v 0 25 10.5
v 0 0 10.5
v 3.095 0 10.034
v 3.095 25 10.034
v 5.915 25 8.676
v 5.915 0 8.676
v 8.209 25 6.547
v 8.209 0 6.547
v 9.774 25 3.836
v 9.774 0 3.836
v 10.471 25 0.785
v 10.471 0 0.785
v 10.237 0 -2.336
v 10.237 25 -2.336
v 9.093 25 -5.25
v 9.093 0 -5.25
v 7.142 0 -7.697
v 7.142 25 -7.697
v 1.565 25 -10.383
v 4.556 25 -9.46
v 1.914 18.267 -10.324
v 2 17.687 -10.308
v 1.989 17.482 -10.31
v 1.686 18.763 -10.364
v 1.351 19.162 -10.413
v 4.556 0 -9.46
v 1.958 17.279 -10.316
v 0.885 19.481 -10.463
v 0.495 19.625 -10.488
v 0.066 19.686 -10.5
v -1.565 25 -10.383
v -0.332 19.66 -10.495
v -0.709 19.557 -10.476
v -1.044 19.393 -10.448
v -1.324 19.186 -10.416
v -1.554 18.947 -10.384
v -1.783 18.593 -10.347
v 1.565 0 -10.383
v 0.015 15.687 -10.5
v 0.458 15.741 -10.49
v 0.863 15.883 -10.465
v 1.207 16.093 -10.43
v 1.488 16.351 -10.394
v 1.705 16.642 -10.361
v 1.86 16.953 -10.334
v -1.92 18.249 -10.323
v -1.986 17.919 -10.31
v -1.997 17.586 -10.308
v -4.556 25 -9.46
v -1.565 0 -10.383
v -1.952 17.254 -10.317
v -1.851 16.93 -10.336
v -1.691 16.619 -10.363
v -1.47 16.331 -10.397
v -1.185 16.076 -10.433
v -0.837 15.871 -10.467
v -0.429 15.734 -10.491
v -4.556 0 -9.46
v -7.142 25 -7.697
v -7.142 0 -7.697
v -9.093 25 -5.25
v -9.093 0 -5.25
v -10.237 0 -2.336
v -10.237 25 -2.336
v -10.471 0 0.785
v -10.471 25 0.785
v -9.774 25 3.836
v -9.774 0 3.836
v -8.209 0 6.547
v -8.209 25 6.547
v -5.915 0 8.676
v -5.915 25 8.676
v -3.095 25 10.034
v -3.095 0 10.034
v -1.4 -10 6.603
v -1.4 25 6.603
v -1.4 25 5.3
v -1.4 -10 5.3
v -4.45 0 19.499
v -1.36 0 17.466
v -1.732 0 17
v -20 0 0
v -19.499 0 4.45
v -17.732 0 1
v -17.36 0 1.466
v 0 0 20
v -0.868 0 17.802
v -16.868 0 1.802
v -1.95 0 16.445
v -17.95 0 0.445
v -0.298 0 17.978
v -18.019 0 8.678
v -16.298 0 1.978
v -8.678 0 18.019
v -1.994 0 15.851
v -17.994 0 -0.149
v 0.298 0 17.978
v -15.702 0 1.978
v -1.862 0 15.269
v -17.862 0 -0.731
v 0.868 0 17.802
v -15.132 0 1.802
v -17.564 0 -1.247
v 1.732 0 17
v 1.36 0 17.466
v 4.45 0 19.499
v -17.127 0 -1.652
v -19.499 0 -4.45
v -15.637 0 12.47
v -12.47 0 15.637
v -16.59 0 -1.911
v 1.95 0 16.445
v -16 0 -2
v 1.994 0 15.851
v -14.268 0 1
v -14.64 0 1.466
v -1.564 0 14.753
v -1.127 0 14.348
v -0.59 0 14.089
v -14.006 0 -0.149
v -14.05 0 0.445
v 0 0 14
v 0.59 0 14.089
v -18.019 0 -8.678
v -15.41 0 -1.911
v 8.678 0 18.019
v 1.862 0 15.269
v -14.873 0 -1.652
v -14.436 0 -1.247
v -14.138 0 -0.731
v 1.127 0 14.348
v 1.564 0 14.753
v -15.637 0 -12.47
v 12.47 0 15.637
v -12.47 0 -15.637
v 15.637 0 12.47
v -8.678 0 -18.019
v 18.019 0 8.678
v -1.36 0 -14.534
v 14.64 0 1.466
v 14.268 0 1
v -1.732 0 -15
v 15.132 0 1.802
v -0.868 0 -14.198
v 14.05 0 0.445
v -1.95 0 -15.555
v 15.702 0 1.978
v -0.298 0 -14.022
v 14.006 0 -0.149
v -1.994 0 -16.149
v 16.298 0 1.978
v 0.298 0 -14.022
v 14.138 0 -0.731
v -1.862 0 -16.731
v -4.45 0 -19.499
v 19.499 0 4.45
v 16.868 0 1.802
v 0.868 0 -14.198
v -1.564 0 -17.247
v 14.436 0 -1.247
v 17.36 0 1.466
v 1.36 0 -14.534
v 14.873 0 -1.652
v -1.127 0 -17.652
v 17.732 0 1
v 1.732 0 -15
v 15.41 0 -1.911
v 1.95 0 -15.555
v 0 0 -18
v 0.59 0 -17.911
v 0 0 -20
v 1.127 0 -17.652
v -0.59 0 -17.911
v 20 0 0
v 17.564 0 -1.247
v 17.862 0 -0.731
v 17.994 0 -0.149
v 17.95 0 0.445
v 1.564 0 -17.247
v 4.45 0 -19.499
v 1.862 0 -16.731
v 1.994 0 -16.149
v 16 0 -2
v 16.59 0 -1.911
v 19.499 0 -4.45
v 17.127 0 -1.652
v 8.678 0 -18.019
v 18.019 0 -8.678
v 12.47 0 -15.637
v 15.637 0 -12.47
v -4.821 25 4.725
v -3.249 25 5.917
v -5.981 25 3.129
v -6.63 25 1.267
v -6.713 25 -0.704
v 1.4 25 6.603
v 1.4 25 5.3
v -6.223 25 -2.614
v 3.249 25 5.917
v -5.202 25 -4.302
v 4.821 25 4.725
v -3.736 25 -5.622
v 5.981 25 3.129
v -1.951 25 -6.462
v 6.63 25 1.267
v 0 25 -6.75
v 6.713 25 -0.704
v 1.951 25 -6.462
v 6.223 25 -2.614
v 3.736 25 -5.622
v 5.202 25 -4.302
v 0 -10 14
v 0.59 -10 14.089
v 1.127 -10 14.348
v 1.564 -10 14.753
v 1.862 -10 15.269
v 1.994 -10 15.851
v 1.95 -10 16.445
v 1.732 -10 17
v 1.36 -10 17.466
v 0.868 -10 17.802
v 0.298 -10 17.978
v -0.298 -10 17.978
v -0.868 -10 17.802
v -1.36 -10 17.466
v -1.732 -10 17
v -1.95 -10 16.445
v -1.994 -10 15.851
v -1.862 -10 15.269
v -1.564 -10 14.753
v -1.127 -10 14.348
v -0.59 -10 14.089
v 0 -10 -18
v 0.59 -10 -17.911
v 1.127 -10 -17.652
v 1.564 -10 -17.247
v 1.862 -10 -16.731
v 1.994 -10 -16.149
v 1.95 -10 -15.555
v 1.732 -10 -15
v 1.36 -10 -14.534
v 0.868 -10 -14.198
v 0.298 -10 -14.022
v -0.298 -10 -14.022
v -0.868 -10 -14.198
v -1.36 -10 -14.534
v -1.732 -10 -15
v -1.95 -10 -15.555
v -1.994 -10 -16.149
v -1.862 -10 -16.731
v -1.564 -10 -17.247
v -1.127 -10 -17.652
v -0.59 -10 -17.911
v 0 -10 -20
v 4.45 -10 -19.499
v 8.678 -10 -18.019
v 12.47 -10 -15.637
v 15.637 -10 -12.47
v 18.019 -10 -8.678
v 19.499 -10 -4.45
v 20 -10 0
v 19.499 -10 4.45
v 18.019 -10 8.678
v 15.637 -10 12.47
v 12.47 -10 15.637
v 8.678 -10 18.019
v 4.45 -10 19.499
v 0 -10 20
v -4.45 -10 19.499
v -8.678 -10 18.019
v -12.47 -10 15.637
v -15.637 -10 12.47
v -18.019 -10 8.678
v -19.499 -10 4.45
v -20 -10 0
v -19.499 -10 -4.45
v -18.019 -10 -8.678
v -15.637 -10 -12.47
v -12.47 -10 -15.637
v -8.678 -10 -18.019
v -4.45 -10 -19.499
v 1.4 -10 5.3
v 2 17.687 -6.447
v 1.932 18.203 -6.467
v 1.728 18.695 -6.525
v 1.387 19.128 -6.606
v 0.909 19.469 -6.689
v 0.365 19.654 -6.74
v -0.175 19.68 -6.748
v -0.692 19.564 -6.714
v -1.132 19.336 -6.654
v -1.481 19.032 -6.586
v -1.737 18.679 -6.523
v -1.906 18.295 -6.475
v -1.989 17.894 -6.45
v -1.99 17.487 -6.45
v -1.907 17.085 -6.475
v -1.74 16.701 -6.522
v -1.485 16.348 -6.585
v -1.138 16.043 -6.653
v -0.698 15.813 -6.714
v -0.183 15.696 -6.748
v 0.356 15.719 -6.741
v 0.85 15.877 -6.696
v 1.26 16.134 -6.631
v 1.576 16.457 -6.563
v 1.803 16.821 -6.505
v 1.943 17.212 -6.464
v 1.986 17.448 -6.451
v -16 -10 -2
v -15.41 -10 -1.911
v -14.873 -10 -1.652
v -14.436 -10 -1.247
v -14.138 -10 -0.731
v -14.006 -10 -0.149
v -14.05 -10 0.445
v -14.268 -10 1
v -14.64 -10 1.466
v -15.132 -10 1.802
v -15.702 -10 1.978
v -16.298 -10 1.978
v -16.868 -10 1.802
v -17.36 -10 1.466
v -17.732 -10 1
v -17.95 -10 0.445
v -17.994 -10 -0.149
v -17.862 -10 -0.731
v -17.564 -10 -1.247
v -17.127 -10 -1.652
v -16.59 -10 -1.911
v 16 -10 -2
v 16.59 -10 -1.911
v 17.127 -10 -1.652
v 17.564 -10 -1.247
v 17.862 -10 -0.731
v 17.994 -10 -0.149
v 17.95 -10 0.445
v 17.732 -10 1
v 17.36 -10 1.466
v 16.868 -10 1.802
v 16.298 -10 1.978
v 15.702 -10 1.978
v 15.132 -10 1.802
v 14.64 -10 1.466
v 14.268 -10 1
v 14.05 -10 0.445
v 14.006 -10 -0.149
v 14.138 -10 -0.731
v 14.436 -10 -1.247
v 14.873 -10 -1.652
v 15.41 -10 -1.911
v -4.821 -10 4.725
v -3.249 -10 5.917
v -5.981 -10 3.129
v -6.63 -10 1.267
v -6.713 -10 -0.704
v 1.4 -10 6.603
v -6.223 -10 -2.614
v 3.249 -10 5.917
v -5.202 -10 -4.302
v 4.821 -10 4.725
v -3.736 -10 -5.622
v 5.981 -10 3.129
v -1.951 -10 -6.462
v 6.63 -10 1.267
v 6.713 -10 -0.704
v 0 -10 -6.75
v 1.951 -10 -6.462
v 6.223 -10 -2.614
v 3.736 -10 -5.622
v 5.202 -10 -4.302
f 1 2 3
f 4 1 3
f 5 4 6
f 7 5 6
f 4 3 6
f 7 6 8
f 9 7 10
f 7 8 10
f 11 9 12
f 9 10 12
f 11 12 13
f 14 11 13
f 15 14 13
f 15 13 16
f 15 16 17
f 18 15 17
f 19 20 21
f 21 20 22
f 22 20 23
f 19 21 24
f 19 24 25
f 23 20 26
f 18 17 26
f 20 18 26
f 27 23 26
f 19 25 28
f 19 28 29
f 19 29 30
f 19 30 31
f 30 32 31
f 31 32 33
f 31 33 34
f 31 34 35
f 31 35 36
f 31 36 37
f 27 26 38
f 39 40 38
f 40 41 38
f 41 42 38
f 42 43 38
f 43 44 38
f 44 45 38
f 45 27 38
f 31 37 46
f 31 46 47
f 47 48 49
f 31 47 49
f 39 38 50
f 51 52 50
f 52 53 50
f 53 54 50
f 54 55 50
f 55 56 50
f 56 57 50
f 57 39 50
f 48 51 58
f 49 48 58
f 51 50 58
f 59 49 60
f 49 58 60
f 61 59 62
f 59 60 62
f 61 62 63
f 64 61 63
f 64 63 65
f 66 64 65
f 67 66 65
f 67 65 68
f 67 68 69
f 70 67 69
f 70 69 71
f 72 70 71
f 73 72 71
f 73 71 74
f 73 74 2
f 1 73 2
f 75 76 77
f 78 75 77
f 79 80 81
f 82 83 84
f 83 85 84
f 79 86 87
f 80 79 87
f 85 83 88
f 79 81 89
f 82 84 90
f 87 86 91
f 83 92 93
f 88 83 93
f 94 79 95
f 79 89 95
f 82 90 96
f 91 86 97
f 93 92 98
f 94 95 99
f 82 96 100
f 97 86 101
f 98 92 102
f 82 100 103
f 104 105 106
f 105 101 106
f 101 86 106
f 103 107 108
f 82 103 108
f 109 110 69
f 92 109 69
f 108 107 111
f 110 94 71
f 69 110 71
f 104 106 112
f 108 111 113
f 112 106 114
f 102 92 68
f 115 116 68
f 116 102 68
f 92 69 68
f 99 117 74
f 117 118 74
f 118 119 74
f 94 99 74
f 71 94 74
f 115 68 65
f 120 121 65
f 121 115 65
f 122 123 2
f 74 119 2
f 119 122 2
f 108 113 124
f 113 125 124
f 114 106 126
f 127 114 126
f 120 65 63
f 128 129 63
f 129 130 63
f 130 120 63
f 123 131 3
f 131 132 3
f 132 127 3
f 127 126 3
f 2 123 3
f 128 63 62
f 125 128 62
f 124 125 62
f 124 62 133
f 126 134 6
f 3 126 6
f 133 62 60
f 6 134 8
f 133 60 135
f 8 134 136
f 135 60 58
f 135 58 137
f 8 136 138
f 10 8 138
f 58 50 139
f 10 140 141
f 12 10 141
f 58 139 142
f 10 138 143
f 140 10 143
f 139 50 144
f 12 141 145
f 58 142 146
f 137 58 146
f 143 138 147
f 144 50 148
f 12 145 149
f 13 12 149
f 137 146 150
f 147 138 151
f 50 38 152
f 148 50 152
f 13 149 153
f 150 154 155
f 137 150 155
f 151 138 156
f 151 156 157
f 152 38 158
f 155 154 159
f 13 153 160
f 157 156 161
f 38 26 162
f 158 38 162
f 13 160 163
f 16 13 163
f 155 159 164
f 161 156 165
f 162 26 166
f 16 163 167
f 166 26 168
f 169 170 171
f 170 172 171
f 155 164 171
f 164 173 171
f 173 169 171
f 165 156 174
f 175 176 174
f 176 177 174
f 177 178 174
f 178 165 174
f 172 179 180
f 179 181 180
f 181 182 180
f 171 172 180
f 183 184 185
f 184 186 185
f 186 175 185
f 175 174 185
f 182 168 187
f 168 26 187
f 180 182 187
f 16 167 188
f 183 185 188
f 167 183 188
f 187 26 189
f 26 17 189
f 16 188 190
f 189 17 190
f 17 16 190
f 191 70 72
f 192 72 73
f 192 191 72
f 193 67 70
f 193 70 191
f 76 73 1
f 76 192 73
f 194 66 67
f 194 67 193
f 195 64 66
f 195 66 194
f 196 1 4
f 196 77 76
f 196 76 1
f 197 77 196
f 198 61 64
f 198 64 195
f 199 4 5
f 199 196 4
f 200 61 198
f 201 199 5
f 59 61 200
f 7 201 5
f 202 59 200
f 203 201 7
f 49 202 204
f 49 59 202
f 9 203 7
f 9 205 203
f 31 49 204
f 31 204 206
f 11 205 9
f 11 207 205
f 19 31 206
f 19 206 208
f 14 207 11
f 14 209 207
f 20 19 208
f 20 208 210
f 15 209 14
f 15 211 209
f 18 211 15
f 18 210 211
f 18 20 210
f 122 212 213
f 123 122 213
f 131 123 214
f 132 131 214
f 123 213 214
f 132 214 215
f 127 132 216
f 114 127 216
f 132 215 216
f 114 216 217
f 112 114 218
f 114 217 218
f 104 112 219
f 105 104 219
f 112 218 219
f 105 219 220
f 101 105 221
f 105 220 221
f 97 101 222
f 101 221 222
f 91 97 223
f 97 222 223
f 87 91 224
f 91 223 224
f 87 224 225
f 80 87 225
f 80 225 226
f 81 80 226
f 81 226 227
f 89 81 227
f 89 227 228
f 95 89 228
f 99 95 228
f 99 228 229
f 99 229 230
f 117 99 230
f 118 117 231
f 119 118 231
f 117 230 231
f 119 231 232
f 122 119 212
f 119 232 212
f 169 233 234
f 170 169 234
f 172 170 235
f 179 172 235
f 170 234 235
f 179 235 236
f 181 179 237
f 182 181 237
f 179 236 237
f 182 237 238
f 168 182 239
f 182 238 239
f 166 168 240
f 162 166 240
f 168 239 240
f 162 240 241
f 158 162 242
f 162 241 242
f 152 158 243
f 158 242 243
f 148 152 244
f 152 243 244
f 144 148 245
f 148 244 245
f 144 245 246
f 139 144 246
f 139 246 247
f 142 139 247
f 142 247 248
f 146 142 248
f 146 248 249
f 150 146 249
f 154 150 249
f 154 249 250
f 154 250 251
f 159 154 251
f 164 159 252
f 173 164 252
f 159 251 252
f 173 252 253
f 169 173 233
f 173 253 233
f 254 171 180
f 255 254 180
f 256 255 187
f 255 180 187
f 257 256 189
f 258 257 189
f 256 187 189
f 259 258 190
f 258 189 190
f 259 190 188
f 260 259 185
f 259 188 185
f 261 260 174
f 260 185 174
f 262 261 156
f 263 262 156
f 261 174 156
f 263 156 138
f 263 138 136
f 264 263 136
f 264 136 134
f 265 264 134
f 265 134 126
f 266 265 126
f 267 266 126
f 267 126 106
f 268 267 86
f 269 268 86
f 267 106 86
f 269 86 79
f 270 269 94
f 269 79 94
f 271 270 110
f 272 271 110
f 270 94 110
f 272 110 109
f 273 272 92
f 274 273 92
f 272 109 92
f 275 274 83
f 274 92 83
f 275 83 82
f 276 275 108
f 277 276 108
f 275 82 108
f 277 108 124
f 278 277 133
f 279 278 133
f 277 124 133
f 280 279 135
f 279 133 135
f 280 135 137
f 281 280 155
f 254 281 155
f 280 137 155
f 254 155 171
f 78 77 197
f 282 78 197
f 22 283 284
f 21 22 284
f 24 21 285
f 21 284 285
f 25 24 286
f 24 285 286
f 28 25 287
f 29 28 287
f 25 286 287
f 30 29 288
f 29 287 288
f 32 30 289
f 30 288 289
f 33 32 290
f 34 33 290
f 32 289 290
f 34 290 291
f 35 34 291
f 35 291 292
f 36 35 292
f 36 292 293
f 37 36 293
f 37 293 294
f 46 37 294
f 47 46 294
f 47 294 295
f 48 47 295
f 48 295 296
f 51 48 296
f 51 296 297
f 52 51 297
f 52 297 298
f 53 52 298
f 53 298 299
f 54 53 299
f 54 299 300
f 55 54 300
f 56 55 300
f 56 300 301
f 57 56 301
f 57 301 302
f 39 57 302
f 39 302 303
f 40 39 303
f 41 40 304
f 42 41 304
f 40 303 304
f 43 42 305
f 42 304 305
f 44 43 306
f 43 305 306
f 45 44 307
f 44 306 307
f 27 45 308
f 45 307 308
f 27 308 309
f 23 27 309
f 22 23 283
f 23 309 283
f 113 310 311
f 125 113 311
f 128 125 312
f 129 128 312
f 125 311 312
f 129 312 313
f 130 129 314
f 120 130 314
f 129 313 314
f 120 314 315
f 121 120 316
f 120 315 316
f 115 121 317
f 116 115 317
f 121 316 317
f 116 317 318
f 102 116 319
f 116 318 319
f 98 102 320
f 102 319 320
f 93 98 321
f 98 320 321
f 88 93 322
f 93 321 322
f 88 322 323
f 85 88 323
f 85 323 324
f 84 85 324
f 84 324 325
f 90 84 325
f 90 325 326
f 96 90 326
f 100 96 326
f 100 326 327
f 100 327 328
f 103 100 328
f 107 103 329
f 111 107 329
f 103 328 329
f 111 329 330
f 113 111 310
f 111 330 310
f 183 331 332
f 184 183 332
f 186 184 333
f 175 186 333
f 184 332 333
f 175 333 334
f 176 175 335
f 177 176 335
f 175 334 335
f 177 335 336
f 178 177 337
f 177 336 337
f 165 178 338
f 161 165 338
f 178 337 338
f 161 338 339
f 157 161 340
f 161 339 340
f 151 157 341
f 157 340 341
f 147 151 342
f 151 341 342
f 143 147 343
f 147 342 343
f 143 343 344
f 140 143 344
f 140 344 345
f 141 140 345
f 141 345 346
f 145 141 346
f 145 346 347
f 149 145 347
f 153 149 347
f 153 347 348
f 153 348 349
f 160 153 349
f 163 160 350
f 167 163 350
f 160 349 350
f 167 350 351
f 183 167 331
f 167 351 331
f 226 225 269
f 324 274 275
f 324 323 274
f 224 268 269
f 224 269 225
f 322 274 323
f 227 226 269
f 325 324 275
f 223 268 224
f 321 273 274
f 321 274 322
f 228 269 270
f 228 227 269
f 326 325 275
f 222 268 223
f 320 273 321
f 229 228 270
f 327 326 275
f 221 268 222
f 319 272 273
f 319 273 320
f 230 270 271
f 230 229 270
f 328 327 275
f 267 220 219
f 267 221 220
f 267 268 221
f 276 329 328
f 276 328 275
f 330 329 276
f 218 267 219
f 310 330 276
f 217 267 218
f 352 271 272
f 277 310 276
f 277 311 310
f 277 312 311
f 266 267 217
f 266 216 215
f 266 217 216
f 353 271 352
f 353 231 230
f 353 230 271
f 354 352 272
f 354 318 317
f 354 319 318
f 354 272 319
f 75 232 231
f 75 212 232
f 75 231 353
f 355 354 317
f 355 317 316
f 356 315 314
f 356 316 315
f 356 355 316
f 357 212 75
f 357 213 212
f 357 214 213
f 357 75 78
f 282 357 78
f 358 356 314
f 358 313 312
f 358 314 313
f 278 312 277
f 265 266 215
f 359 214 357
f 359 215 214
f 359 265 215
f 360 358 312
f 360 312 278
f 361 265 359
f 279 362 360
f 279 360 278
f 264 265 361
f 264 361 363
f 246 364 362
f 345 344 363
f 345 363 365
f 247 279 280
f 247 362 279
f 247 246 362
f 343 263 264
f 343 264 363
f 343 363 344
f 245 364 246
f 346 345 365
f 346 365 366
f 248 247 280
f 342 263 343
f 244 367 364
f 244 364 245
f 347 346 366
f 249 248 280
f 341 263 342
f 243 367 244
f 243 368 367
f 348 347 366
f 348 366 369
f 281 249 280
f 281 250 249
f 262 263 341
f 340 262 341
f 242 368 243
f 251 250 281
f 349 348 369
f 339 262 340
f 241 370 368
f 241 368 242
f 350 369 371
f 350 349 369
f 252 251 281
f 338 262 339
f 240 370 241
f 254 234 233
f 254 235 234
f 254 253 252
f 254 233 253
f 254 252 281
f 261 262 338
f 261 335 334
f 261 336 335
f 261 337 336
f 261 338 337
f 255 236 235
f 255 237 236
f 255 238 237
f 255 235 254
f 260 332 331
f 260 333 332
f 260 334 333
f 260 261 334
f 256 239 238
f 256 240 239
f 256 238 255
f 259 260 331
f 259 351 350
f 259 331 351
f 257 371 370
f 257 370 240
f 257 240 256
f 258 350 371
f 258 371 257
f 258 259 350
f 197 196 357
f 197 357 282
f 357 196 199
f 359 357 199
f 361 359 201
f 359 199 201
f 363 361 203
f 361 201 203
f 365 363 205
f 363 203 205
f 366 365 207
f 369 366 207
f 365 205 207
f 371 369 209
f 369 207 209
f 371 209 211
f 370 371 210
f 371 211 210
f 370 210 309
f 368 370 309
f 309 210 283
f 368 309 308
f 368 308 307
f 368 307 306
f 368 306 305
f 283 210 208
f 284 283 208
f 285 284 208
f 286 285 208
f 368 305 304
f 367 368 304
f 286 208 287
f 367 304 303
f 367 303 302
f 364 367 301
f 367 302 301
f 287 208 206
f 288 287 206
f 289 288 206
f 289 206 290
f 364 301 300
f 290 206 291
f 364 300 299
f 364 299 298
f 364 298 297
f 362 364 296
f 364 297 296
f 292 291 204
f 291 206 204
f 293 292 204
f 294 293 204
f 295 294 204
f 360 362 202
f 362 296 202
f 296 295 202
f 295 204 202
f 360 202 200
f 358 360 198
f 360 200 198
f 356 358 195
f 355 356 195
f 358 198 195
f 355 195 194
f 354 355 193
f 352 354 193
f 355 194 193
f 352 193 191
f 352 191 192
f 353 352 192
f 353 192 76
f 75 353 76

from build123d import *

# Parameters (mm, degrees)
SKETCH1_R           = 10.5
BOSS_EXTRUDE1_DEPTH = 25
SKETCH4_R           = 20
BOSS_EXTRUDE2_DEPTH = 10
SKETCH5_R           = 6.75
CUT_EXTRUDE1_DEPTH  = 46
SKETCH6_W           = 2.8
SKETCH6_H           = 2.9
BOSS_EXTRUDE3_DEPTH = 35
SKETCH7_R           = 2
CUT_EXTRUDE2_DEPTH  = 10
SKETCH8_R           = 2
CUT_EXTRUDE3_DEPTH  = 20


with BuildPart() as part:
    # Sketch1 → Boss-Extrude1 (new body)
    with BuildSketch(Plane(origin=(0, 0, 0), x_dir=(1, 0, 0), z_dir=(0, 1, 0))):
        with Locations(Location((0, 0, 0), (0, 0, 270))):
            Circle(SKETCH1_R)
    extrude(amount=BOSS_EXTRUDE1_DEPTH)

    # Sketch4 → Boss-Extrude2 (add)
    with BuildSketch(Plane.XZ):
        with Locations(Location((0, 0, 0), (0, 0, 270))):
            Circle(SKETCH4_R)
    extrude(amount=BOSS_EXTRUDE2_DEPTH)

    # Sketch5 → Cut-Extrude1 (cut, through all)
    with BuildSketch(Plane(origin=(0, 25, 0), x_dir=(1, 0, 0), z_dir=(0, 1, 0))):
        with Locations(Location((0, 0, 0), (0, 0, 270))):
            Circle(SKETCH5_R)
    extrude(amount=-CUT_EXTRUDE1_DEPTH, mode=Mode.SUBTRACT)

    # Sketch6 → Boss-Extrude3 (add, through all)
    with BuildSketch(Plane(origin=(0, 25, 0), x_dir=(1, 0, 0), z_dir=(0, 1, 0))):
        with Locations((0, -6.75)):
            Rectangle(SKETCH6_W, SKETCH6_H)
    extrude(amount=-BOSS_EXTRUDE3_DEPTH)

    # Sketch7 → Cut-Extrude2 (cut)
    with BuildSketch(Plane.XZ.offset(10)):
        with Locations(Location((0, 16, 0), (0, 0, 270))):
            Circle(SKETCH7_R)
        with Locations(Location((16, 0, 0), (0, 0, 270))):
            Circle(SKETCH7_R)
        with Locations(Location((0, -16, 0), (0, 0, 270))):
            Circle(SKETCH7_R)
        with Locations(Location((-16, 0, 0), (0, 0, 270))):
            Circle(SKETCH7_R)
    extrude(amount=-CUT_EXTRUDE2_DEPTH, mode=Mode.SUBTRACT)

    # Sketch8 → Cut-Extrude3 (cut)
    with BuildSketch(Plane.XY):
        with Locations((0, 17.687279486)):
            Circle(SKETCH8_R)
    extrude(amount=-CUT_EXTRUDE3_DEPTH, mode=Mode.SUBTRACT)


solid = part.part
